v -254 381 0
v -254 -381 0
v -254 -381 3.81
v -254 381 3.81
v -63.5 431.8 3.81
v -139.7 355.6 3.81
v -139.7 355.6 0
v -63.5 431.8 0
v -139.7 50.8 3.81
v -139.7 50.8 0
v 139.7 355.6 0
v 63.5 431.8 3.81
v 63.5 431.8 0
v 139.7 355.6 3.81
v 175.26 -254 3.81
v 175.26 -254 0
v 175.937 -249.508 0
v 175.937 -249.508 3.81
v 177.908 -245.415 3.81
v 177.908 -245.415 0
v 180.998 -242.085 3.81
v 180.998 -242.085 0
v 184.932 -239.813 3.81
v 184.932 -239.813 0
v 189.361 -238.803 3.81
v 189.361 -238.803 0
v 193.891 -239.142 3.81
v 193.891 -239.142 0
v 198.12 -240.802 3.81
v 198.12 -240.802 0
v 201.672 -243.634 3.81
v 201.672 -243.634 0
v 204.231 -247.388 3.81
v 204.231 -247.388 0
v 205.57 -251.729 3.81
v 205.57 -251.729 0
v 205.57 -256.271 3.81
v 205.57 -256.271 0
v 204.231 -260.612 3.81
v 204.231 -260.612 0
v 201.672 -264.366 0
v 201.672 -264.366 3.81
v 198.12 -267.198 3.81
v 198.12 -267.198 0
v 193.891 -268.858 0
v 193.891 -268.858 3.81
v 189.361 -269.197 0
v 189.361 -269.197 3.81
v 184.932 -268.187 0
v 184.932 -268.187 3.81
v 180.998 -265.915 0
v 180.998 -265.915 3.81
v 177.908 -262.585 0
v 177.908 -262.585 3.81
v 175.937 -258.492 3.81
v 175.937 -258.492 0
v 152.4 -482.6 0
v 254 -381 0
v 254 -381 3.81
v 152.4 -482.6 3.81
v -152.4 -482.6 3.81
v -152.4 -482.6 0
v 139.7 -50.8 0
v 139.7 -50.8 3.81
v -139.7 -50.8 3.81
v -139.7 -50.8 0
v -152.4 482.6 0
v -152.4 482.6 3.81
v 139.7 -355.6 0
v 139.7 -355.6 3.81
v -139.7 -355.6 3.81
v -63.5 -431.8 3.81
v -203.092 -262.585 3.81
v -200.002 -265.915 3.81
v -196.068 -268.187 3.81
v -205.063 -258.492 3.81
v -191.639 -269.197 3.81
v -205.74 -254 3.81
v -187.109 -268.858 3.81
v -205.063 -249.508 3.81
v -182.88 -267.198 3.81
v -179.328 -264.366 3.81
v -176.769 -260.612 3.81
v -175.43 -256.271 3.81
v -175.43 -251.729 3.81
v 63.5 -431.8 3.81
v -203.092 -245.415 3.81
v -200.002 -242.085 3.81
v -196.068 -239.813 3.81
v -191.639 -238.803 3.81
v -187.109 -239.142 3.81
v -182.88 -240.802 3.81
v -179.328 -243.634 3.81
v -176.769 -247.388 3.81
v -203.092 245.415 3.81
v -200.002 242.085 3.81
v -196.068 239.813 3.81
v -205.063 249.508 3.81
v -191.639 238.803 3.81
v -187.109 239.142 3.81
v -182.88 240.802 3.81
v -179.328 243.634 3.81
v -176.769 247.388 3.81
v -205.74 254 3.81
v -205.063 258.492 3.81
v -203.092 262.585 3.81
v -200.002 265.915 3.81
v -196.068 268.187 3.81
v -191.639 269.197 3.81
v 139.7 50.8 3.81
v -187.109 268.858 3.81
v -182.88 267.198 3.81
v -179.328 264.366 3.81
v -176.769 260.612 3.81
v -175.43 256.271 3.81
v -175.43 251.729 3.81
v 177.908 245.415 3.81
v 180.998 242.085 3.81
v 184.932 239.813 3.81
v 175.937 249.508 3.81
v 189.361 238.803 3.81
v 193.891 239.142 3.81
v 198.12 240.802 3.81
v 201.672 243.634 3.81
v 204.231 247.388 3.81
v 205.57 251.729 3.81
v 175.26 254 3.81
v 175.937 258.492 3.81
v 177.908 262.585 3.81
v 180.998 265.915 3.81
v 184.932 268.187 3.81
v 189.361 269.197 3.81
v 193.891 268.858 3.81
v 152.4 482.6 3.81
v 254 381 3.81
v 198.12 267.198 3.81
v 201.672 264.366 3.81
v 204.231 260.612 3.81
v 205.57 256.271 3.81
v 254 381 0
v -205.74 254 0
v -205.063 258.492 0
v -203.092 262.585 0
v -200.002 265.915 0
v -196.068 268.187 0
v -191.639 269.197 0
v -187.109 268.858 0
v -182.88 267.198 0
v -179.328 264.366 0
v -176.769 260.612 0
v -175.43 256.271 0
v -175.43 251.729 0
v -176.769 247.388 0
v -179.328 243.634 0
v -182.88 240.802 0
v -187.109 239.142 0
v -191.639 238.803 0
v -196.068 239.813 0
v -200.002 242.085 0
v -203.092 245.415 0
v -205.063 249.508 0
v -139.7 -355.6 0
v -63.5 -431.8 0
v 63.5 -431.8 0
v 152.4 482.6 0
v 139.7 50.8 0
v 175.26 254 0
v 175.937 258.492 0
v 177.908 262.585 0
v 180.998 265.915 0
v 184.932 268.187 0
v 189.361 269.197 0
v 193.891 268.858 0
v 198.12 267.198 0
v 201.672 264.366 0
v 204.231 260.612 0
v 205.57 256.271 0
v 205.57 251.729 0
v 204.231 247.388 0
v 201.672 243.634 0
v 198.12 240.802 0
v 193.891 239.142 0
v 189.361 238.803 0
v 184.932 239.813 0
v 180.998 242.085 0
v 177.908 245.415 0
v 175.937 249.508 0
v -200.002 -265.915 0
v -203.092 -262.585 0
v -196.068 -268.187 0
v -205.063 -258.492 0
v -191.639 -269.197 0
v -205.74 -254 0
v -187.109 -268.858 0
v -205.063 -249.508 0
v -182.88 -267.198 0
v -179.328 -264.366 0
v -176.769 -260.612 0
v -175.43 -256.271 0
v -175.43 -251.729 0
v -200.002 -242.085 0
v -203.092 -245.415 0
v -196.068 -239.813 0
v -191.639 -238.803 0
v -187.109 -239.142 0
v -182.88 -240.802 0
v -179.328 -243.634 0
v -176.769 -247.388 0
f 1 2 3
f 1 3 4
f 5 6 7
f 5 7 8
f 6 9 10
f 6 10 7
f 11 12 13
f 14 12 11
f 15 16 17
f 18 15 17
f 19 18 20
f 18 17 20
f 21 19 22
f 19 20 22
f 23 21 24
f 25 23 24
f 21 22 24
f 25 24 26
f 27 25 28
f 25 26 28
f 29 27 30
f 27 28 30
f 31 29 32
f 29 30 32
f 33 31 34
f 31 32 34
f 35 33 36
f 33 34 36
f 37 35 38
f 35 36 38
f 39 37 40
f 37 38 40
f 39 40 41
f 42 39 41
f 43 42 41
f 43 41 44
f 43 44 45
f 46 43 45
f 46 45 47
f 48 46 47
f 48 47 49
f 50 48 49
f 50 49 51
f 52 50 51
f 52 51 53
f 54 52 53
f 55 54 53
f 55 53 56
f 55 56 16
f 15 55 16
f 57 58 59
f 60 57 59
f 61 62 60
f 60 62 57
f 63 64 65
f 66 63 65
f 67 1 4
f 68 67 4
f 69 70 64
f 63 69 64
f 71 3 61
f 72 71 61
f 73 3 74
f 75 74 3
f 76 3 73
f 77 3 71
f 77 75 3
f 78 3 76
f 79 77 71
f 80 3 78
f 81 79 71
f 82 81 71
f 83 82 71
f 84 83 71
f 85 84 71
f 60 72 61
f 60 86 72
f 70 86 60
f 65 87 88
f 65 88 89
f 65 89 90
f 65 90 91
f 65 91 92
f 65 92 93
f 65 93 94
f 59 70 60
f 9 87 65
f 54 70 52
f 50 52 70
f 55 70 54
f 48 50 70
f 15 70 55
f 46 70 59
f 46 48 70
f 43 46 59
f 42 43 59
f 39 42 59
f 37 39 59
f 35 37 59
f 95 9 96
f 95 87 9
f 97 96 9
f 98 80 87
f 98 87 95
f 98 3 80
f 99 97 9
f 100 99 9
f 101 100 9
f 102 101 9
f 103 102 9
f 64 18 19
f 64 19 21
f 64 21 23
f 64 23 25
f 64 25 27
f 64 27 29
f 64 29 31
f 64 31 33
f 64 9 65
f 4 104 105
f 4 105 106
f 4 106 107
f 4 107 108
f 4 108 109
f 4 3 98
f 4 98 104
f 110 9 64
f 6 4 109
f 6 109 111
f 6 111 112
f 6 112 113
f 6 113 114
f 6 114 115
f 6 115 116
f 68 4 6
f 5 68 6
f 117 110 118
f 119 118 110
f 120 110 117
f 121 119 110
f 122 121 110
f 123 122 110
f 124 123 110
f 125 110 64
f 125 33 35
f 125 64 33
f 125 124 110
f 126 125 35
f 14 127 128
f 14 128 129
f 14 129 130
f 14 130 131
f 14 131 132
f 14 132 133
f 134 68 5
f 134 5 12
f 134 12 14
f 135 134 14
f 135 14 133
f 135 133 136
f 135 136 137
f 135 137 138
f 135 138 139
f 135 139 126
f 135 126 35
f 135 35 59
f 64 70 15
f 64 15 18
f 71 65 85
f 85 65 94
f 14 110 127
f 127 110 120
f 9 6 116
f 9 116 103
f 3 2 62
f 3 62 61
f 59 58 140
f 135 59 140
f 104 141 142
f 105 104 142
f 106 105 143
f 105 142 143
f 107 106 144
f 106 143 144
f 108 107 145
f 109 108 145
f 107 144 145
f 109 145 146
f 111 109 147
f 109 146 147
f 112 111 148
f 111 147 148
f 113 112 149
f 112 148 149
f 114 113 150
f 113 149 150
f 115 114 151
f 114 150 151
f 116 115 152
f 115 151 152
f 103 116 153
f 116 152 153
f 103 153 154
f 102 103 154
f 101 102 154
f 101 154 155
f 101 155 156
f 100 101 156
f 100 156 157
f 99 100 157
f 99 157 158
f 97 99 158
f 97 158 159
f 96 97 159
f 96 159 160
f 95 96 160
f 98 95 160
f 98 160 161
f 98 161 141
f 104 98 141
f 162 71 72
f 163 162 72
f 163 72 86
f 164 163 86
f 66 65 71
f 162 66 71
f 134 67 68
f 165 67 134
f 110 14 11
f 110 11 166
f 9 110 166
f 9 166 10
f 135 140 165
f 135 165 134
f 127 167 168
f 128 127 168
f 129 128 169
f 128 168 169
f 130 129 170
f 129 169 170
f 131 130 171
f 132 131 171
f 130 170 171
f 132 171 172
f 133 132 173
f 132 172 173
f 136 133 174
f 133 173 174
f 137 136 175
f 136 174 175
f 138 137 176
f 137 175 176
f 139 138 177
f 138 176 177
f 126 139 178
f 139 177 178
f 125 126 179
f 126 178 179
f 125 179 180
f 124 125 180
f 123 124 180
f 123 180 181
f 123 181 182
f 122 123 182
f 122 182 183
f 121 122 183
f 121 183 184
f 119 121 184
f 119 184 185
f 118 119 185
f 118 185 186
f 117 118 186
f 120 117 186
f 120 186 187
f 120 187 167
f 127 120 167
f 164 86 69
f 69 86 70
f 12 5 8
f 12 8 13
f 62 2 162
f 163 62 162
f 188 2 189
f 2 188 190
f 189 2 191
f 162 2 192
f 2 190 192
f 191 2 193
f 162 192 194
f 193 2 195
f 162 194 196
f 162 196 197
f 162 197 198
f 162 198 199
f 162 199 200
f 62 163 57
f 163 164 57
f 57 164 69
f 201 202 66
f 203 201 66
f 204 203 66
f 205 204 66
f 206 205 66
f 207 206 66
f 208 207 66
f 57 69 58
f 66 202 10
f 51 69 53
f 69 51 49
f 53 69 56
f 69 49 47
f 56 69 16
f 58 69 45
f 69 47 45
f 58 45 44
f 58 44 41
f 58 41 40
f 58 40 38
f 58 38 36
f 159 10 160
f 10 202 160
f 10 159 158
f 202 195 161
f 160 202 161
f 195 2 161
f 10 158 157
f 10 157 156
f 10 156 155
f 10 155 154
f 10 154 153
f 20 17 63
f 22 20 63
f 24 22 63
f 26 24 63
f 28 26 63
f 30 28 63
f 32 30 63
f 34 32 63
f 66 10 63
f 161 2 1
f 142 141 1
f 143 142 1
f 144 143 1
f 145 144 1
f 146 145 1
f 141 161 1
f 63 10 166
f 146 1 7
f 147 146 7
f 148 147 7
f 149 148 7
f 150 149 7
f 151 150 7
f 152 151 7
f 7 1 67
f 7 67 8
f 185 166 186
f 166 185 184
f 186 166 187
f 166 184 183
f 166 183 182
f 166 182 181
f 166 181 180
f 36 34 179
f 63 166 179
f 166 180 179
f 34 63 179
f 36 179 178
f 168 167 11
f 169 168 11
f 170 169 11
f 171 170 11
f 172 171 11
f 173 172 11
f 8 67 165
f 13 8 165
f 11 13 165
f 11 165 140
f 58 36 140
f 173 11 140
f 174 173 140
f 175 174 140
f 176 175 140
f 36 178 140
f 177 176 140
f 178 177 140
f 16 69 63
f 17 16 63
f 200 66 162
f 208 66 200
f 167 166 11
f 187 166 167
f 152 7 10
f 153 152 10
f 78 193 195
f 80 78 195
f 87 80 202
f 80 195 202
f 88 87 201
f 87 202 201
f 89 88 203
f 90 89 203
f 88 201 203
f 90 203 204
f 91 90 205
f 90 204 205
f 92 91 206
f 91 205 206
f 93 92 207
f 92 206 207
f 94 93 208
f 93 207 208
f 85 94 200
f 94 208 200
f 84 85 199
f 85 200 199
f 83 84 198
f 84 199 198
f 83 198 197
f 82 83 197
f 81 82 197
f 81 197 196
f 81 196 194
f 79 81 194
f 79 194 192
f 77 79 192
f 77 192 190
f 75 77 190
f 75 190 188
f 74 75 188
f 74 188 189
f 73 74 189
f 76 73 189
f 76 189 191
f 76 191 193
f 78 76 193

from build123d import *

# Parameters (mm, degrees)
SKETCH1_W                   = 508
SKETCH1_H                   = 965.2
BOSS_EXTRUDE1_DEPTH         = 3.81
F_1_16_1_2_DIAMETER_HOLE1_D = 30.48
CHAMFER1_SIZE               = 101.6
CUT_EXTRUDE2_DEPTH          = 4.81


with BuildPart() as part:
    # Sketch1 → Boss-Extrude1 (new body)
    with BuildSketch(Plane.XY):
        Rectangle(SKETCH1_W, SKETCH1_H)
    extrude(amount=BOSS_EXTRUDE1_DEPTH)

    # 1/16 (1.2) Diameter Hole1 (through all)
    with Locations(Plane.XY.offset(3.81)):
        with Locations((-190.5, 254), (190.5, 254), (190.5, -254), (-190.5, -254)):
            Hole(F_1_16_1_2_DIAMETER_HOLE1_D / 2)

    # Chamfer1
    chamfer1_edges = [part.edges().sort_by_distance(p)[0] for p in [
        (-254, 482.6, 1.905),
        (-254, -482.6, 1.905),
        (254, -482.6, 1.905),
        (254, 482.6, 1.905),
    ]]
    chamfer(chamfer1_edges, length=CHAMFER1_SIZE)

    # Sketch6 → Cut-Extrude2 (cut, through all)
    with BuildSketch(Plane.XY.offset(3.81)):
        Polygon((-63.5, 431.8), (63.5, 431.8), (139.7, 355.6), (139.7, 50.8), (-139.7, 50.8), (-139.7, 355.6), align=None)
        Polygon((139.7, -355.6), (139.7, -50.8), (-139.7, -50.8), (-139.7, -355.6), (-63.5, -431.8), (63.5, -431.8), align=None)
    extrude(amount=-CUT_EXTRUDE2_DEPTH, mode=Mode.SUBTRACT)


solid = part.part
